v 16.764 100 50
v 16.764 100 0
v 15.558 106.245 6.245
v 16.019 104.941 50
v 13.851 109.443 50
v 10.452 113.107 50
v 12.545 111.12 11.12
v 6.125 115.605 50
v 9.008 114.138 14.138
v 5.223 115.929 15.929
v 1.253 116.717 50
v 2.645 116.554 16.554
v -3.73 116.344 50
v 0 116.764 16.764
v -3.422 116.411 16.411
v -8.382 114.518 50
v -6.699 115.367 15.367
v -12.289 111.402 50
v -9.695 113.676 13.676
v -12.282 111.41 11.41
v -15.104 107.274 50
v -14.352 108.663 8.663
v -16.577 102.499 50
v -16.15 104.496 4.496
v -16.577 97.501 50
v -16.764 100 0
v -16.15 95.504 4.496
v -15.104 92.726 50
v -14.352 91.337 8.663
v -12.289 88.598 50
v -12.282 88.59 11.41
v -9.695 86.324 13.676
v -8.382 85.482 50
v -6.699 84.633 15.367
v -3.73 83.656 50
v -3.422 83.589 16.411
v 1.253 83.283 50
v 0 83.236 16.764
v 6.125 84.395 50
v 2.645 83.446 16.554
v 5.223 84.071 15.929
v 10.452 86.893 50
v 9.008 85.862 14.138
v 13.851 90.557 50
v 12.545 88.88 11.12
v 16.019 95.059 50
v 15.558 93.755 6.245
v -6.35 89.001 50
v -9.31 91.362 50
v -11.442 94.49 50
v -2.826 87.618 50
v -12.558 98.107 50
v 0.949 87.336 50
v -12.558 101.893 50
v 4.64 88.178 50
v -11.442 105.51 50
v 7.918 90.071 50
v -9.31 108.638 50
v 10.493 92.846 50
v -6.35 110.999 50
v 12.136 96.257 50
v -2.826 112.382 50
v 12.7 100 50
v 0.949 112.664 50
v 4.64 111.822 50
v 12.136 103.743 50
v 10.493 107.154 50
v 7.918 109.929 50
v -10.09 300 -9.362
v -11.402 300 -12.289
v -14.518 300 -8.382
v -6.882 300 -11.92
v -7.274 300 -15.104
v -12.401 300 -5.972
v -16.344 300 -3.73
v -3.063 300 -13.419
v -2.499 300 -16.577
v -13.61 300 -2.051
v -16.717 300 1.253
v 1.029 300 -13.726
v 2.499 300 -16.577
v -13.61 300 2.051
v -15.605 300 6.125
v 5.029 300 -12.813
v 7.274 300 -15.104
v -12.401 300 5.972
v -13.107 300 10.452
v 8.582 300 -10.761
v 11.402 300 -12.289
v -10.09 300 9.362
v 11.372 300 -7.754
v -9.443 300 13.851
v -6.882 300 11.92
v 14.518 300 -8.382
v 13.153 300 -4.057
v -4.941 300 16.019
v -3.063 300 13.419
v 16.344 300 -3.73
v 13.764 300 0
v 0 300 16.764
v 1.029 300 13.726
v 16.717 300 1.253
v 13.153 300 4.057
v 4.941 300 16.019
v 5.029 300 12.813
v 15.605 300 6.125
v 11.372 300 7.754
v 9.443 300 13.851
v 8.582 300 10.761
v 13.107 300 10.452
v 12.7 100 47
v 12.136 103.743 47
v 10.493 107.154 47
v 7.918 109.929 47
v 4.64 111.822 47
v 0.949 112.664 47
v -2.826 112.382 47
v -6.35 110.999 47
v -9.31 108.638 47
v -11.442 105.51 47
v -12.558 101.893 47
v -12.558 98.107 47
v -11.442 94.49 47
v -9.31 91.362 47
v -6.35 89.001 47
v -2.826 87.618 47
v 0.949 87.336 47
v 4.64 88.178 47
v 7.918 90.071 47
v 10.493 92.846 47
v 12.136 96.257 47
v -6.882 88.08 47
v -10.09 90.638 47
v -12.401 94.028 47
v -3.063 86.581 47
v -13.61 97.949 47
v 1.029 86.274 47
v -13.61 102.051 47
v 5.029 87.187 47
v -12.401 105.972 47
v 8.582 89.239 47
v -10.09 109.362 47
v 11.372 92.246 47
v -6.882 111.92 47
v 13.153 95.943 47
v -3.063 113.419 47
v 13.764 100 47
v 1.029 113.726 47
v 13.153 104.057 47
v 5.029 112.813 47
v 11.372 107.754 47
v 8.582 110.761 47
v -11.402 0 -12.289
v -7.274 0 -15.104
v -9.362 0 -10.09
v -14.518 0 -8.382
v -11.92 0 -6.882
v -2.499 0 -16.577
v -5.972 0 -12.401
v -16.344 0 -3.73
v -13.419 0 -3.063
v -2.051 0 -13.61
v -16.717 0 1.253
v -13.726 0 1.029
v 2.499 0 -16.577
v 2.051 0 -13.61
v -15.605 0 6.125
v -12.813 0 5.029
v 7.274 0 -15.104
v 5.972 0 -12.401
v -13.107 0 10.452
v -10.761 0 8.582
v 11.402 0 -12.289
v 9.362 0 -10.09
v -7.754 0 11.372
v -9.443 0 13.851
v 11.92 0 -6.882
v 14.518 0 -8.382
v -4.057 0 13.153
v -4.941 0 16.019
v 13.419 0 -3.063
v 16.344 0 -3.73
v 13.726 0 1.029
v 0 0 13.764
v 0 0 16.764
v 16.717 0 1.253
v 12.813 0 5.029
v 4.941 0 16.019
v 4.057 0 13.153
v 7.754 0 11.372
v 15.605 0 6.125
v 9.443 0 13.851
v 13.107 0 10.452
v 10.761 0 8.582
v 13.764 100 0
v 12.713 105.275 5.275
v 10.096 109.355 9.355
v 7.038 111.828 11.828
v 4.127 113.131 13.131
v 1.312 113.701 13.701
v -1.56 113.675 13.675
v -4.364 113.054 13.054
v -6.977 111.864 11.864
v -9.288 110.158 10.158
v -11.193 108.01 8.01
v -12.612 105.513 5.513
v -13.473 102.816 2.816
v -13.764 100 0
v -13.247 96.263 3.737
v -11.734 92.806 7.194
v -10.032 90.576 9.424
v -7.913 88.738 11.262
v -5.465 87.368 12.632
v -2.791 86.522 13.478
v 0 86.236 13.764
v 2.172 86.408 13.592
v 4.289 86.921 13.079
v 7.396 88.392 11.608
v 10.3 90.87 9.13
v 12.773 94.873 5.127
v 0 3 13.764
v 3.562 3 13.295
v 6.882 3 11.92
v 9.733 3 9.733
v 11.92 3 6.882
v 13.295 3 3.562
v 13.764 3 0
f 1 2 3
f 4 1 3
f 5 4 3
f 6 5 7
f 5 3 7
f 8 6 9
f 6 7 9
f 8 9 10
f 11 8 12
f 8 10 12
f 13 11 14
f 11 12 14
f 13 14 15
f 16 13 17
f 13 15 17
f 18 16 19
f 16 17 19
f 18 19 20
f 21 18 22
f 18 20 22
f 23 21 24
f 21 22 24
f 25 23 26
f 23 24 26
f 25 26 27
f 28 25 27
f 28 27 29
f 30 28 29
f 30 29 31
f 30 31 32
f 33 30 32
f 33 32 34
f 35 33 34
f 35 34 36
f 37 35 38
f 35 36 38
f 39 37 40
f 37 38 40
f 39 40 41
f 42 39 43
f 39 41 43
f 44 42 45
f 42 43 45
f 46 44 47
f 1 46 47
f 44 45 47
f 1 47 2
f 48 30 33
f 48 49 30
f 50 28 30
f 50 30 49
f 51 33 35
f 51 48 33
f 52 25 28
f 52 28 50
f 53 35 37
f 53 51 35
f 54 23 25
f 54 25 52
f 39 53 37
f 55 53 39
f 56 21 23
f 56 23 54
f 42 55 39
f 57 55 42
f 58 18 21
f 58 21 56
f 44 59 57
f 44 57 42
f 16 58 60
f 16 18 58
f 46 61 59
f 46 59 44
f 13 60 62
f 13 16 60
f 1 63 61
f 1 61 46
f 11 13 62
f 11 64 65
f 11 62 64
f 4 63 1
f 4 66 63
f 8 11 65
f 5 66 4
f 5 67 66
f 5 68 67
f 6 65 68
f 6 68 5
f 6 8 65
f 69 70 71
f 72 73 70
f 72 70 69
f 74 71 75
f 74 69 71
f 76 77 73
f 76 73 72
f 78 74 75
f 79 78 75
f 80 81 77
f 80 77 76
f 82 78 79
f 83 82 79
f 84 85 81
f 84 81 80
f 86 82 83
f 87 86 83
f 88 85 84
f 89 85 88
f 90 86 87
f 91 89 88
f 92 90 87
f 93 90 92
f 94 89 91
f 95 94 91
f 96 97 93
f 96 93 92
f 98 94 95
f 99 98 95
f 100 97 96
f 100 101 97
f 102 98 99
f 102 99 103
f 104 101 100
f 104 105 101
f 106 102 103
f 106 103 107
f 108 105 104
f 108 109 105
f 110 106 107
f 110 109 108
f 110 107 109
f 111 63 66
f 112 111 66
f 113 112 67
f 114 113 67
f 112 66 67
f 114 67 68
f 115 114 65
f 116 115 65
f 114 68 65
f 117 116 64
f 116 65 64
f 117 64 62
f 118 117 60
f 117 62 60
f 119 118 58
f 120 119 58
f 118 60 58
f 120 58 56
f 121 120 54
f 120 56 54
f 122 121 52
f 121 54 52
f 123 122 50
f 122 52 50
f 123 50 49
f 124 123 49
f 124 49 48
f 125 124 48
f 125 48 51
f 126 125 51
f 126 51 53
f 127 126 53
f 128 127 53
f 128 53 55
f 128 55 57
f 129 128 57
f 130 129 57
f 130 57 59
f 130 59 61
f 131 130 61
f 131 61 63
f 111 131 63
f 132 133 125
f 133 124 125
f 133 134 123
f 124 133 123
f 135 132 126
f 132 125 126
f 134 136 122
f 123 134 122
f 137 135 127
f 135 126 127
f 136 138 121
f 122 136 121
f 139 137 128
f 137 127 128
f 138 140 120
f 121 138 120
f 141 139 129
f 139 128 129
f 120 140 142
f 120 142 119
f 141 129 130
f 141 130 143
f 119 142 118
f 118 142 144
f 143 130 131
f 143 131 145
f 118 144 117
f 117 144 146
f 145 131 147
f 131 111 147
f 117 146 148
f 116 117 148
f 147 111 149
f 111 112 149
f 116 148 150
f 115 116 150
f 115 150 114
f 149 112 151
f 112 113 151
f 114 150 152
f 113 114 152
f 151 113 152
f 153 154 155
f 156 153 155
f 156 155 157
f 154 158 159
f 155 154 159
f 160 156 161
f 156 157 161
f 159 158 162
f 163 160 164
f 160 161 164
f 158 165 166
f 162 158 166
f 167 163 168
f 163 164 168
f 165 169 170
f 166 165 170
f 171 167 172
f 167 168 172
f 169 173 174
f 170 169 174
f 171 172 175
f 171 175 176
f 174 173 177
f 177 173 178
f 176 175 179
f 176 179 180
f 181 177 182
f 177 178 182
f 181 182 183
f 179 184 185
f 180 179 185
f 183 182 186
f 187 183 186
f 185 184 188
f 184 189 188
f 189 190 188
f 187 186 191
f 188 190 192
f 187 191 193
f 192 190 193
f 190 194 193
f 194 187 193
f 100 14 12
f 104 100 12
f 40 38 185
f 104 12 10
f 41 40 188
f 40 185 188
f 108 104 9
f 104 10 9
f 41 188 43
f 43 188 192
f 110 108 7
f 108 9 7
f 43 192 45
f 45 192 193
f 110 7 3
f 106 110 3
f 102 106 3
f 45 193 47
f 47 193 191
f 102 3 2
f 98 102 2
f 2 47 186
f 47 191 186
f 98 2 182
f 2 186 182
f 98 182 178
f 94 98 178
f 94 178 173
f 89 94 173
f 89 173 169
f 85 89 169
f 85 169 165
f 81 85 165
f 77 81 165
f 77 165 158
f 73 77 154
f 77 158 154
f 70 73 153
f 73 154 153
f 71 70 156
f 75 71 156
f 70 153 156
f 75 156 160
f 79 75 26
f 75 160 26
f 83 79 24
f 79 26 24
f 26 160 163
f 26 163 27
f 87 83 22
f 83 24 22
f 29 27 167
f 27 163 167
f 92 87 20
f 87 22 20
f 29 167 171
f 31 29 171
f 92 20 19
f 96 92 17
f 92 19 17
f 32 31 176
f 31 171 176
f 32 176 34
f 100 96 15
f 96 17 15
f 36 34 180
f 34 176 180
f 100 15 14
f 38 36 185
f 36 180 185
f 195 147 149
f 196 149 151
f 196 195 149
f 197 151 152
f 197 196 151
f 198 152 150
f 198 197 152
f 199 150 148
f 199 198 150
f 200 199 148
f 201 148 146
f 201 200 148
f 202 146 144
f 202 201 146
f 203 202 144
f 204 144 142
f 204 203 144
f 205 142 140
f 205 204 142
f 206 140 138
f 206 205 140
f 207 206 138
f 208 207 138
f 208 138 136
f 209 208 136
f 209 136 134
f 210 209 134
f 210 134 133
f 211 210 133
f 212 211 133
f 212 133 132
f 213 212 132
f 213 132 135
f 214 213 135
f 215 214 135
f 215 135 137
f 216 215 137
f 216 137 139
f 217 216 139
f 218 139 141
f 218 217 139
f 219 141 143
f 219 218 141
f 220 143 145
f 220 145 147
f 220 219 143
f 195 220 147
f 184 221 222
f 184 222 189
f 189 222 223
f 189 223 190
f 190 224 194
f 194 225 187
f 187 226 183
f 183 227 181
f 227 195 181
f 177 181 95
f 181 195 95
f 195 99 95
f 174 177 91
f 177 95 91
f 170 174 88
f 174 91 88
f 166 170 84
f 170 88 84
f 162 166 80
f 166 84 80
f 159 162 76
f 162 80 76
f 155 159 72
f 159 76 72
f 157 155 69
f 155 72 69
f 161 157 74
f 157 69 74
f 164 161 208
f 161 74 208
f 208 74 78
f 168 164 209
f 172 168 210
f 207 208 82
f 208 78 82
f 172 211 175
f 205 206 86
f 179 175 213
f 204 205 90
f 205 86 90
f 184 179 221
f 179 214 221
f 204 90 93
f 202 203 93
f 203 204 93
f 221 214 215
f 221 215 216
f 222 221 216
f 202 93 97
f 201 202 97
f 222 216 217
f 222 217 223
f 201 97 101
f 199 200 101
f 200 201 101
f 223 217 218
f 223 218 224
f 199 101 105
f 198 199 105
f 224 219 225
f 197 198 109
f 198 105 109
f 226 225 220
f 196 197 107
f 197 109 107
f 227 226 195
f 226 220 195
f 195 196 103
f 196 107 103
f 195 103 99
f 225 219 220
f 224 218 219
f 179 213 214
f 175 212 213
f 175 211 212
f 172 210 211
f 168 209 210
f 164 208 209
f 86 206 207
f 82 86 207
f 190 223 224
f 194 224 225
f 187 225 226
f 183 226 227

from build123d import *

# Parameters (mm, degrees)
SKETCH1_R           = 16.764
BOSS_EXTRUDE1_DEPTH = 300
SKETCH2_R           = 16.764
BOSS_EXTRUDE2_DEPTH = 50
SHELL1_START        = 3
SHELL1_OUTLINE_R    = 13.764
SHELL1_DEPTH        = 297
SHELL1_START_2      = -1e-07
SHELL1_2_OUTLINE_R  = 13.764
SHELL1_2_DEPTH      = 47.0000001
SKETCH3_R           = 12.7
CUT_EXTRUDE1_DEPTH  = 20
SKETCH4_R           = 13.764
CUT_EXTRUDE2_DEPTH  = 302.645539824


with BuildPart() as part:
    # Sketch1 → Boss-Extrude1 (new body)
    with BuildSketch(Plane(origin=(0, 0, 0), x_dir=(1, 0, 0), z_dir=(0, 1, 0))):
        with Locations(Location((0, 0, 0), (0, 0, 270))):
            Circle(SKETCH1_R)
    extrude(amount=BOSS_EXTRUDE1_DEPTH)

    # Sketch2 → Boss-Extrude2 (add)
    with BuildSketch(Plane.XY):
        with Locations((0, 100)):
            Circle(SKETCH2_R)
    extrude(amount=BOSS_EXTRUDE2_DEPTH)

    # Shell1: read off the stored shape, not the designer's step
    # Shell1 outline → Shell1 (cut)
    with BuildSketch(Plane(origin=(0, 0, 0), x_dir=(1, 0, 0), z_dir=(0, 1, 0)).offset(SHELL1_START)):
        Circle(SHELL1_OUTLINE_R)
    extrude(amount=SHELL1_DEPTH, mode=Mode.SUBTRACT)

    # Shell1 2 outline → Shell1 2 (cut)
    with BuildSketch(Plane.XY.offset(SHELL1_START_2)):
        with Locations((0, 100)):
            Circle(SHELL1_2_OUTLINE_R)
    extrude(amount=SHELL1_2_DEPTH, mode=Mode.SUBTRACT)

    # Sketch3 → Cut-Extrude1 (cut)
    with BuildSketch(Plane.XY.offset(50)):
        with Locations((0, 100)):
            Circle(SKETCH3_R)
    extrude(amount=-CUT_EXTRUDE1_DEPTH, mode=Mode.SUBTRACT)

    # Sketch4 → Cut-Extrude2 (cut, through all)
    with BuildSketch(Plane(origin=(0, 3, 0), x_dir=(1, 0, 0), z_dir=(0, 1, 0))):
        with Locations(Location((0, 0, 0), (0, 0, 270))):
            Circle(SKETCH4_R)
    extrude(amount=-CUT_EXTRUDE2_DEPTH, mode=Mode.SUBTRACT)


solid = part.part
